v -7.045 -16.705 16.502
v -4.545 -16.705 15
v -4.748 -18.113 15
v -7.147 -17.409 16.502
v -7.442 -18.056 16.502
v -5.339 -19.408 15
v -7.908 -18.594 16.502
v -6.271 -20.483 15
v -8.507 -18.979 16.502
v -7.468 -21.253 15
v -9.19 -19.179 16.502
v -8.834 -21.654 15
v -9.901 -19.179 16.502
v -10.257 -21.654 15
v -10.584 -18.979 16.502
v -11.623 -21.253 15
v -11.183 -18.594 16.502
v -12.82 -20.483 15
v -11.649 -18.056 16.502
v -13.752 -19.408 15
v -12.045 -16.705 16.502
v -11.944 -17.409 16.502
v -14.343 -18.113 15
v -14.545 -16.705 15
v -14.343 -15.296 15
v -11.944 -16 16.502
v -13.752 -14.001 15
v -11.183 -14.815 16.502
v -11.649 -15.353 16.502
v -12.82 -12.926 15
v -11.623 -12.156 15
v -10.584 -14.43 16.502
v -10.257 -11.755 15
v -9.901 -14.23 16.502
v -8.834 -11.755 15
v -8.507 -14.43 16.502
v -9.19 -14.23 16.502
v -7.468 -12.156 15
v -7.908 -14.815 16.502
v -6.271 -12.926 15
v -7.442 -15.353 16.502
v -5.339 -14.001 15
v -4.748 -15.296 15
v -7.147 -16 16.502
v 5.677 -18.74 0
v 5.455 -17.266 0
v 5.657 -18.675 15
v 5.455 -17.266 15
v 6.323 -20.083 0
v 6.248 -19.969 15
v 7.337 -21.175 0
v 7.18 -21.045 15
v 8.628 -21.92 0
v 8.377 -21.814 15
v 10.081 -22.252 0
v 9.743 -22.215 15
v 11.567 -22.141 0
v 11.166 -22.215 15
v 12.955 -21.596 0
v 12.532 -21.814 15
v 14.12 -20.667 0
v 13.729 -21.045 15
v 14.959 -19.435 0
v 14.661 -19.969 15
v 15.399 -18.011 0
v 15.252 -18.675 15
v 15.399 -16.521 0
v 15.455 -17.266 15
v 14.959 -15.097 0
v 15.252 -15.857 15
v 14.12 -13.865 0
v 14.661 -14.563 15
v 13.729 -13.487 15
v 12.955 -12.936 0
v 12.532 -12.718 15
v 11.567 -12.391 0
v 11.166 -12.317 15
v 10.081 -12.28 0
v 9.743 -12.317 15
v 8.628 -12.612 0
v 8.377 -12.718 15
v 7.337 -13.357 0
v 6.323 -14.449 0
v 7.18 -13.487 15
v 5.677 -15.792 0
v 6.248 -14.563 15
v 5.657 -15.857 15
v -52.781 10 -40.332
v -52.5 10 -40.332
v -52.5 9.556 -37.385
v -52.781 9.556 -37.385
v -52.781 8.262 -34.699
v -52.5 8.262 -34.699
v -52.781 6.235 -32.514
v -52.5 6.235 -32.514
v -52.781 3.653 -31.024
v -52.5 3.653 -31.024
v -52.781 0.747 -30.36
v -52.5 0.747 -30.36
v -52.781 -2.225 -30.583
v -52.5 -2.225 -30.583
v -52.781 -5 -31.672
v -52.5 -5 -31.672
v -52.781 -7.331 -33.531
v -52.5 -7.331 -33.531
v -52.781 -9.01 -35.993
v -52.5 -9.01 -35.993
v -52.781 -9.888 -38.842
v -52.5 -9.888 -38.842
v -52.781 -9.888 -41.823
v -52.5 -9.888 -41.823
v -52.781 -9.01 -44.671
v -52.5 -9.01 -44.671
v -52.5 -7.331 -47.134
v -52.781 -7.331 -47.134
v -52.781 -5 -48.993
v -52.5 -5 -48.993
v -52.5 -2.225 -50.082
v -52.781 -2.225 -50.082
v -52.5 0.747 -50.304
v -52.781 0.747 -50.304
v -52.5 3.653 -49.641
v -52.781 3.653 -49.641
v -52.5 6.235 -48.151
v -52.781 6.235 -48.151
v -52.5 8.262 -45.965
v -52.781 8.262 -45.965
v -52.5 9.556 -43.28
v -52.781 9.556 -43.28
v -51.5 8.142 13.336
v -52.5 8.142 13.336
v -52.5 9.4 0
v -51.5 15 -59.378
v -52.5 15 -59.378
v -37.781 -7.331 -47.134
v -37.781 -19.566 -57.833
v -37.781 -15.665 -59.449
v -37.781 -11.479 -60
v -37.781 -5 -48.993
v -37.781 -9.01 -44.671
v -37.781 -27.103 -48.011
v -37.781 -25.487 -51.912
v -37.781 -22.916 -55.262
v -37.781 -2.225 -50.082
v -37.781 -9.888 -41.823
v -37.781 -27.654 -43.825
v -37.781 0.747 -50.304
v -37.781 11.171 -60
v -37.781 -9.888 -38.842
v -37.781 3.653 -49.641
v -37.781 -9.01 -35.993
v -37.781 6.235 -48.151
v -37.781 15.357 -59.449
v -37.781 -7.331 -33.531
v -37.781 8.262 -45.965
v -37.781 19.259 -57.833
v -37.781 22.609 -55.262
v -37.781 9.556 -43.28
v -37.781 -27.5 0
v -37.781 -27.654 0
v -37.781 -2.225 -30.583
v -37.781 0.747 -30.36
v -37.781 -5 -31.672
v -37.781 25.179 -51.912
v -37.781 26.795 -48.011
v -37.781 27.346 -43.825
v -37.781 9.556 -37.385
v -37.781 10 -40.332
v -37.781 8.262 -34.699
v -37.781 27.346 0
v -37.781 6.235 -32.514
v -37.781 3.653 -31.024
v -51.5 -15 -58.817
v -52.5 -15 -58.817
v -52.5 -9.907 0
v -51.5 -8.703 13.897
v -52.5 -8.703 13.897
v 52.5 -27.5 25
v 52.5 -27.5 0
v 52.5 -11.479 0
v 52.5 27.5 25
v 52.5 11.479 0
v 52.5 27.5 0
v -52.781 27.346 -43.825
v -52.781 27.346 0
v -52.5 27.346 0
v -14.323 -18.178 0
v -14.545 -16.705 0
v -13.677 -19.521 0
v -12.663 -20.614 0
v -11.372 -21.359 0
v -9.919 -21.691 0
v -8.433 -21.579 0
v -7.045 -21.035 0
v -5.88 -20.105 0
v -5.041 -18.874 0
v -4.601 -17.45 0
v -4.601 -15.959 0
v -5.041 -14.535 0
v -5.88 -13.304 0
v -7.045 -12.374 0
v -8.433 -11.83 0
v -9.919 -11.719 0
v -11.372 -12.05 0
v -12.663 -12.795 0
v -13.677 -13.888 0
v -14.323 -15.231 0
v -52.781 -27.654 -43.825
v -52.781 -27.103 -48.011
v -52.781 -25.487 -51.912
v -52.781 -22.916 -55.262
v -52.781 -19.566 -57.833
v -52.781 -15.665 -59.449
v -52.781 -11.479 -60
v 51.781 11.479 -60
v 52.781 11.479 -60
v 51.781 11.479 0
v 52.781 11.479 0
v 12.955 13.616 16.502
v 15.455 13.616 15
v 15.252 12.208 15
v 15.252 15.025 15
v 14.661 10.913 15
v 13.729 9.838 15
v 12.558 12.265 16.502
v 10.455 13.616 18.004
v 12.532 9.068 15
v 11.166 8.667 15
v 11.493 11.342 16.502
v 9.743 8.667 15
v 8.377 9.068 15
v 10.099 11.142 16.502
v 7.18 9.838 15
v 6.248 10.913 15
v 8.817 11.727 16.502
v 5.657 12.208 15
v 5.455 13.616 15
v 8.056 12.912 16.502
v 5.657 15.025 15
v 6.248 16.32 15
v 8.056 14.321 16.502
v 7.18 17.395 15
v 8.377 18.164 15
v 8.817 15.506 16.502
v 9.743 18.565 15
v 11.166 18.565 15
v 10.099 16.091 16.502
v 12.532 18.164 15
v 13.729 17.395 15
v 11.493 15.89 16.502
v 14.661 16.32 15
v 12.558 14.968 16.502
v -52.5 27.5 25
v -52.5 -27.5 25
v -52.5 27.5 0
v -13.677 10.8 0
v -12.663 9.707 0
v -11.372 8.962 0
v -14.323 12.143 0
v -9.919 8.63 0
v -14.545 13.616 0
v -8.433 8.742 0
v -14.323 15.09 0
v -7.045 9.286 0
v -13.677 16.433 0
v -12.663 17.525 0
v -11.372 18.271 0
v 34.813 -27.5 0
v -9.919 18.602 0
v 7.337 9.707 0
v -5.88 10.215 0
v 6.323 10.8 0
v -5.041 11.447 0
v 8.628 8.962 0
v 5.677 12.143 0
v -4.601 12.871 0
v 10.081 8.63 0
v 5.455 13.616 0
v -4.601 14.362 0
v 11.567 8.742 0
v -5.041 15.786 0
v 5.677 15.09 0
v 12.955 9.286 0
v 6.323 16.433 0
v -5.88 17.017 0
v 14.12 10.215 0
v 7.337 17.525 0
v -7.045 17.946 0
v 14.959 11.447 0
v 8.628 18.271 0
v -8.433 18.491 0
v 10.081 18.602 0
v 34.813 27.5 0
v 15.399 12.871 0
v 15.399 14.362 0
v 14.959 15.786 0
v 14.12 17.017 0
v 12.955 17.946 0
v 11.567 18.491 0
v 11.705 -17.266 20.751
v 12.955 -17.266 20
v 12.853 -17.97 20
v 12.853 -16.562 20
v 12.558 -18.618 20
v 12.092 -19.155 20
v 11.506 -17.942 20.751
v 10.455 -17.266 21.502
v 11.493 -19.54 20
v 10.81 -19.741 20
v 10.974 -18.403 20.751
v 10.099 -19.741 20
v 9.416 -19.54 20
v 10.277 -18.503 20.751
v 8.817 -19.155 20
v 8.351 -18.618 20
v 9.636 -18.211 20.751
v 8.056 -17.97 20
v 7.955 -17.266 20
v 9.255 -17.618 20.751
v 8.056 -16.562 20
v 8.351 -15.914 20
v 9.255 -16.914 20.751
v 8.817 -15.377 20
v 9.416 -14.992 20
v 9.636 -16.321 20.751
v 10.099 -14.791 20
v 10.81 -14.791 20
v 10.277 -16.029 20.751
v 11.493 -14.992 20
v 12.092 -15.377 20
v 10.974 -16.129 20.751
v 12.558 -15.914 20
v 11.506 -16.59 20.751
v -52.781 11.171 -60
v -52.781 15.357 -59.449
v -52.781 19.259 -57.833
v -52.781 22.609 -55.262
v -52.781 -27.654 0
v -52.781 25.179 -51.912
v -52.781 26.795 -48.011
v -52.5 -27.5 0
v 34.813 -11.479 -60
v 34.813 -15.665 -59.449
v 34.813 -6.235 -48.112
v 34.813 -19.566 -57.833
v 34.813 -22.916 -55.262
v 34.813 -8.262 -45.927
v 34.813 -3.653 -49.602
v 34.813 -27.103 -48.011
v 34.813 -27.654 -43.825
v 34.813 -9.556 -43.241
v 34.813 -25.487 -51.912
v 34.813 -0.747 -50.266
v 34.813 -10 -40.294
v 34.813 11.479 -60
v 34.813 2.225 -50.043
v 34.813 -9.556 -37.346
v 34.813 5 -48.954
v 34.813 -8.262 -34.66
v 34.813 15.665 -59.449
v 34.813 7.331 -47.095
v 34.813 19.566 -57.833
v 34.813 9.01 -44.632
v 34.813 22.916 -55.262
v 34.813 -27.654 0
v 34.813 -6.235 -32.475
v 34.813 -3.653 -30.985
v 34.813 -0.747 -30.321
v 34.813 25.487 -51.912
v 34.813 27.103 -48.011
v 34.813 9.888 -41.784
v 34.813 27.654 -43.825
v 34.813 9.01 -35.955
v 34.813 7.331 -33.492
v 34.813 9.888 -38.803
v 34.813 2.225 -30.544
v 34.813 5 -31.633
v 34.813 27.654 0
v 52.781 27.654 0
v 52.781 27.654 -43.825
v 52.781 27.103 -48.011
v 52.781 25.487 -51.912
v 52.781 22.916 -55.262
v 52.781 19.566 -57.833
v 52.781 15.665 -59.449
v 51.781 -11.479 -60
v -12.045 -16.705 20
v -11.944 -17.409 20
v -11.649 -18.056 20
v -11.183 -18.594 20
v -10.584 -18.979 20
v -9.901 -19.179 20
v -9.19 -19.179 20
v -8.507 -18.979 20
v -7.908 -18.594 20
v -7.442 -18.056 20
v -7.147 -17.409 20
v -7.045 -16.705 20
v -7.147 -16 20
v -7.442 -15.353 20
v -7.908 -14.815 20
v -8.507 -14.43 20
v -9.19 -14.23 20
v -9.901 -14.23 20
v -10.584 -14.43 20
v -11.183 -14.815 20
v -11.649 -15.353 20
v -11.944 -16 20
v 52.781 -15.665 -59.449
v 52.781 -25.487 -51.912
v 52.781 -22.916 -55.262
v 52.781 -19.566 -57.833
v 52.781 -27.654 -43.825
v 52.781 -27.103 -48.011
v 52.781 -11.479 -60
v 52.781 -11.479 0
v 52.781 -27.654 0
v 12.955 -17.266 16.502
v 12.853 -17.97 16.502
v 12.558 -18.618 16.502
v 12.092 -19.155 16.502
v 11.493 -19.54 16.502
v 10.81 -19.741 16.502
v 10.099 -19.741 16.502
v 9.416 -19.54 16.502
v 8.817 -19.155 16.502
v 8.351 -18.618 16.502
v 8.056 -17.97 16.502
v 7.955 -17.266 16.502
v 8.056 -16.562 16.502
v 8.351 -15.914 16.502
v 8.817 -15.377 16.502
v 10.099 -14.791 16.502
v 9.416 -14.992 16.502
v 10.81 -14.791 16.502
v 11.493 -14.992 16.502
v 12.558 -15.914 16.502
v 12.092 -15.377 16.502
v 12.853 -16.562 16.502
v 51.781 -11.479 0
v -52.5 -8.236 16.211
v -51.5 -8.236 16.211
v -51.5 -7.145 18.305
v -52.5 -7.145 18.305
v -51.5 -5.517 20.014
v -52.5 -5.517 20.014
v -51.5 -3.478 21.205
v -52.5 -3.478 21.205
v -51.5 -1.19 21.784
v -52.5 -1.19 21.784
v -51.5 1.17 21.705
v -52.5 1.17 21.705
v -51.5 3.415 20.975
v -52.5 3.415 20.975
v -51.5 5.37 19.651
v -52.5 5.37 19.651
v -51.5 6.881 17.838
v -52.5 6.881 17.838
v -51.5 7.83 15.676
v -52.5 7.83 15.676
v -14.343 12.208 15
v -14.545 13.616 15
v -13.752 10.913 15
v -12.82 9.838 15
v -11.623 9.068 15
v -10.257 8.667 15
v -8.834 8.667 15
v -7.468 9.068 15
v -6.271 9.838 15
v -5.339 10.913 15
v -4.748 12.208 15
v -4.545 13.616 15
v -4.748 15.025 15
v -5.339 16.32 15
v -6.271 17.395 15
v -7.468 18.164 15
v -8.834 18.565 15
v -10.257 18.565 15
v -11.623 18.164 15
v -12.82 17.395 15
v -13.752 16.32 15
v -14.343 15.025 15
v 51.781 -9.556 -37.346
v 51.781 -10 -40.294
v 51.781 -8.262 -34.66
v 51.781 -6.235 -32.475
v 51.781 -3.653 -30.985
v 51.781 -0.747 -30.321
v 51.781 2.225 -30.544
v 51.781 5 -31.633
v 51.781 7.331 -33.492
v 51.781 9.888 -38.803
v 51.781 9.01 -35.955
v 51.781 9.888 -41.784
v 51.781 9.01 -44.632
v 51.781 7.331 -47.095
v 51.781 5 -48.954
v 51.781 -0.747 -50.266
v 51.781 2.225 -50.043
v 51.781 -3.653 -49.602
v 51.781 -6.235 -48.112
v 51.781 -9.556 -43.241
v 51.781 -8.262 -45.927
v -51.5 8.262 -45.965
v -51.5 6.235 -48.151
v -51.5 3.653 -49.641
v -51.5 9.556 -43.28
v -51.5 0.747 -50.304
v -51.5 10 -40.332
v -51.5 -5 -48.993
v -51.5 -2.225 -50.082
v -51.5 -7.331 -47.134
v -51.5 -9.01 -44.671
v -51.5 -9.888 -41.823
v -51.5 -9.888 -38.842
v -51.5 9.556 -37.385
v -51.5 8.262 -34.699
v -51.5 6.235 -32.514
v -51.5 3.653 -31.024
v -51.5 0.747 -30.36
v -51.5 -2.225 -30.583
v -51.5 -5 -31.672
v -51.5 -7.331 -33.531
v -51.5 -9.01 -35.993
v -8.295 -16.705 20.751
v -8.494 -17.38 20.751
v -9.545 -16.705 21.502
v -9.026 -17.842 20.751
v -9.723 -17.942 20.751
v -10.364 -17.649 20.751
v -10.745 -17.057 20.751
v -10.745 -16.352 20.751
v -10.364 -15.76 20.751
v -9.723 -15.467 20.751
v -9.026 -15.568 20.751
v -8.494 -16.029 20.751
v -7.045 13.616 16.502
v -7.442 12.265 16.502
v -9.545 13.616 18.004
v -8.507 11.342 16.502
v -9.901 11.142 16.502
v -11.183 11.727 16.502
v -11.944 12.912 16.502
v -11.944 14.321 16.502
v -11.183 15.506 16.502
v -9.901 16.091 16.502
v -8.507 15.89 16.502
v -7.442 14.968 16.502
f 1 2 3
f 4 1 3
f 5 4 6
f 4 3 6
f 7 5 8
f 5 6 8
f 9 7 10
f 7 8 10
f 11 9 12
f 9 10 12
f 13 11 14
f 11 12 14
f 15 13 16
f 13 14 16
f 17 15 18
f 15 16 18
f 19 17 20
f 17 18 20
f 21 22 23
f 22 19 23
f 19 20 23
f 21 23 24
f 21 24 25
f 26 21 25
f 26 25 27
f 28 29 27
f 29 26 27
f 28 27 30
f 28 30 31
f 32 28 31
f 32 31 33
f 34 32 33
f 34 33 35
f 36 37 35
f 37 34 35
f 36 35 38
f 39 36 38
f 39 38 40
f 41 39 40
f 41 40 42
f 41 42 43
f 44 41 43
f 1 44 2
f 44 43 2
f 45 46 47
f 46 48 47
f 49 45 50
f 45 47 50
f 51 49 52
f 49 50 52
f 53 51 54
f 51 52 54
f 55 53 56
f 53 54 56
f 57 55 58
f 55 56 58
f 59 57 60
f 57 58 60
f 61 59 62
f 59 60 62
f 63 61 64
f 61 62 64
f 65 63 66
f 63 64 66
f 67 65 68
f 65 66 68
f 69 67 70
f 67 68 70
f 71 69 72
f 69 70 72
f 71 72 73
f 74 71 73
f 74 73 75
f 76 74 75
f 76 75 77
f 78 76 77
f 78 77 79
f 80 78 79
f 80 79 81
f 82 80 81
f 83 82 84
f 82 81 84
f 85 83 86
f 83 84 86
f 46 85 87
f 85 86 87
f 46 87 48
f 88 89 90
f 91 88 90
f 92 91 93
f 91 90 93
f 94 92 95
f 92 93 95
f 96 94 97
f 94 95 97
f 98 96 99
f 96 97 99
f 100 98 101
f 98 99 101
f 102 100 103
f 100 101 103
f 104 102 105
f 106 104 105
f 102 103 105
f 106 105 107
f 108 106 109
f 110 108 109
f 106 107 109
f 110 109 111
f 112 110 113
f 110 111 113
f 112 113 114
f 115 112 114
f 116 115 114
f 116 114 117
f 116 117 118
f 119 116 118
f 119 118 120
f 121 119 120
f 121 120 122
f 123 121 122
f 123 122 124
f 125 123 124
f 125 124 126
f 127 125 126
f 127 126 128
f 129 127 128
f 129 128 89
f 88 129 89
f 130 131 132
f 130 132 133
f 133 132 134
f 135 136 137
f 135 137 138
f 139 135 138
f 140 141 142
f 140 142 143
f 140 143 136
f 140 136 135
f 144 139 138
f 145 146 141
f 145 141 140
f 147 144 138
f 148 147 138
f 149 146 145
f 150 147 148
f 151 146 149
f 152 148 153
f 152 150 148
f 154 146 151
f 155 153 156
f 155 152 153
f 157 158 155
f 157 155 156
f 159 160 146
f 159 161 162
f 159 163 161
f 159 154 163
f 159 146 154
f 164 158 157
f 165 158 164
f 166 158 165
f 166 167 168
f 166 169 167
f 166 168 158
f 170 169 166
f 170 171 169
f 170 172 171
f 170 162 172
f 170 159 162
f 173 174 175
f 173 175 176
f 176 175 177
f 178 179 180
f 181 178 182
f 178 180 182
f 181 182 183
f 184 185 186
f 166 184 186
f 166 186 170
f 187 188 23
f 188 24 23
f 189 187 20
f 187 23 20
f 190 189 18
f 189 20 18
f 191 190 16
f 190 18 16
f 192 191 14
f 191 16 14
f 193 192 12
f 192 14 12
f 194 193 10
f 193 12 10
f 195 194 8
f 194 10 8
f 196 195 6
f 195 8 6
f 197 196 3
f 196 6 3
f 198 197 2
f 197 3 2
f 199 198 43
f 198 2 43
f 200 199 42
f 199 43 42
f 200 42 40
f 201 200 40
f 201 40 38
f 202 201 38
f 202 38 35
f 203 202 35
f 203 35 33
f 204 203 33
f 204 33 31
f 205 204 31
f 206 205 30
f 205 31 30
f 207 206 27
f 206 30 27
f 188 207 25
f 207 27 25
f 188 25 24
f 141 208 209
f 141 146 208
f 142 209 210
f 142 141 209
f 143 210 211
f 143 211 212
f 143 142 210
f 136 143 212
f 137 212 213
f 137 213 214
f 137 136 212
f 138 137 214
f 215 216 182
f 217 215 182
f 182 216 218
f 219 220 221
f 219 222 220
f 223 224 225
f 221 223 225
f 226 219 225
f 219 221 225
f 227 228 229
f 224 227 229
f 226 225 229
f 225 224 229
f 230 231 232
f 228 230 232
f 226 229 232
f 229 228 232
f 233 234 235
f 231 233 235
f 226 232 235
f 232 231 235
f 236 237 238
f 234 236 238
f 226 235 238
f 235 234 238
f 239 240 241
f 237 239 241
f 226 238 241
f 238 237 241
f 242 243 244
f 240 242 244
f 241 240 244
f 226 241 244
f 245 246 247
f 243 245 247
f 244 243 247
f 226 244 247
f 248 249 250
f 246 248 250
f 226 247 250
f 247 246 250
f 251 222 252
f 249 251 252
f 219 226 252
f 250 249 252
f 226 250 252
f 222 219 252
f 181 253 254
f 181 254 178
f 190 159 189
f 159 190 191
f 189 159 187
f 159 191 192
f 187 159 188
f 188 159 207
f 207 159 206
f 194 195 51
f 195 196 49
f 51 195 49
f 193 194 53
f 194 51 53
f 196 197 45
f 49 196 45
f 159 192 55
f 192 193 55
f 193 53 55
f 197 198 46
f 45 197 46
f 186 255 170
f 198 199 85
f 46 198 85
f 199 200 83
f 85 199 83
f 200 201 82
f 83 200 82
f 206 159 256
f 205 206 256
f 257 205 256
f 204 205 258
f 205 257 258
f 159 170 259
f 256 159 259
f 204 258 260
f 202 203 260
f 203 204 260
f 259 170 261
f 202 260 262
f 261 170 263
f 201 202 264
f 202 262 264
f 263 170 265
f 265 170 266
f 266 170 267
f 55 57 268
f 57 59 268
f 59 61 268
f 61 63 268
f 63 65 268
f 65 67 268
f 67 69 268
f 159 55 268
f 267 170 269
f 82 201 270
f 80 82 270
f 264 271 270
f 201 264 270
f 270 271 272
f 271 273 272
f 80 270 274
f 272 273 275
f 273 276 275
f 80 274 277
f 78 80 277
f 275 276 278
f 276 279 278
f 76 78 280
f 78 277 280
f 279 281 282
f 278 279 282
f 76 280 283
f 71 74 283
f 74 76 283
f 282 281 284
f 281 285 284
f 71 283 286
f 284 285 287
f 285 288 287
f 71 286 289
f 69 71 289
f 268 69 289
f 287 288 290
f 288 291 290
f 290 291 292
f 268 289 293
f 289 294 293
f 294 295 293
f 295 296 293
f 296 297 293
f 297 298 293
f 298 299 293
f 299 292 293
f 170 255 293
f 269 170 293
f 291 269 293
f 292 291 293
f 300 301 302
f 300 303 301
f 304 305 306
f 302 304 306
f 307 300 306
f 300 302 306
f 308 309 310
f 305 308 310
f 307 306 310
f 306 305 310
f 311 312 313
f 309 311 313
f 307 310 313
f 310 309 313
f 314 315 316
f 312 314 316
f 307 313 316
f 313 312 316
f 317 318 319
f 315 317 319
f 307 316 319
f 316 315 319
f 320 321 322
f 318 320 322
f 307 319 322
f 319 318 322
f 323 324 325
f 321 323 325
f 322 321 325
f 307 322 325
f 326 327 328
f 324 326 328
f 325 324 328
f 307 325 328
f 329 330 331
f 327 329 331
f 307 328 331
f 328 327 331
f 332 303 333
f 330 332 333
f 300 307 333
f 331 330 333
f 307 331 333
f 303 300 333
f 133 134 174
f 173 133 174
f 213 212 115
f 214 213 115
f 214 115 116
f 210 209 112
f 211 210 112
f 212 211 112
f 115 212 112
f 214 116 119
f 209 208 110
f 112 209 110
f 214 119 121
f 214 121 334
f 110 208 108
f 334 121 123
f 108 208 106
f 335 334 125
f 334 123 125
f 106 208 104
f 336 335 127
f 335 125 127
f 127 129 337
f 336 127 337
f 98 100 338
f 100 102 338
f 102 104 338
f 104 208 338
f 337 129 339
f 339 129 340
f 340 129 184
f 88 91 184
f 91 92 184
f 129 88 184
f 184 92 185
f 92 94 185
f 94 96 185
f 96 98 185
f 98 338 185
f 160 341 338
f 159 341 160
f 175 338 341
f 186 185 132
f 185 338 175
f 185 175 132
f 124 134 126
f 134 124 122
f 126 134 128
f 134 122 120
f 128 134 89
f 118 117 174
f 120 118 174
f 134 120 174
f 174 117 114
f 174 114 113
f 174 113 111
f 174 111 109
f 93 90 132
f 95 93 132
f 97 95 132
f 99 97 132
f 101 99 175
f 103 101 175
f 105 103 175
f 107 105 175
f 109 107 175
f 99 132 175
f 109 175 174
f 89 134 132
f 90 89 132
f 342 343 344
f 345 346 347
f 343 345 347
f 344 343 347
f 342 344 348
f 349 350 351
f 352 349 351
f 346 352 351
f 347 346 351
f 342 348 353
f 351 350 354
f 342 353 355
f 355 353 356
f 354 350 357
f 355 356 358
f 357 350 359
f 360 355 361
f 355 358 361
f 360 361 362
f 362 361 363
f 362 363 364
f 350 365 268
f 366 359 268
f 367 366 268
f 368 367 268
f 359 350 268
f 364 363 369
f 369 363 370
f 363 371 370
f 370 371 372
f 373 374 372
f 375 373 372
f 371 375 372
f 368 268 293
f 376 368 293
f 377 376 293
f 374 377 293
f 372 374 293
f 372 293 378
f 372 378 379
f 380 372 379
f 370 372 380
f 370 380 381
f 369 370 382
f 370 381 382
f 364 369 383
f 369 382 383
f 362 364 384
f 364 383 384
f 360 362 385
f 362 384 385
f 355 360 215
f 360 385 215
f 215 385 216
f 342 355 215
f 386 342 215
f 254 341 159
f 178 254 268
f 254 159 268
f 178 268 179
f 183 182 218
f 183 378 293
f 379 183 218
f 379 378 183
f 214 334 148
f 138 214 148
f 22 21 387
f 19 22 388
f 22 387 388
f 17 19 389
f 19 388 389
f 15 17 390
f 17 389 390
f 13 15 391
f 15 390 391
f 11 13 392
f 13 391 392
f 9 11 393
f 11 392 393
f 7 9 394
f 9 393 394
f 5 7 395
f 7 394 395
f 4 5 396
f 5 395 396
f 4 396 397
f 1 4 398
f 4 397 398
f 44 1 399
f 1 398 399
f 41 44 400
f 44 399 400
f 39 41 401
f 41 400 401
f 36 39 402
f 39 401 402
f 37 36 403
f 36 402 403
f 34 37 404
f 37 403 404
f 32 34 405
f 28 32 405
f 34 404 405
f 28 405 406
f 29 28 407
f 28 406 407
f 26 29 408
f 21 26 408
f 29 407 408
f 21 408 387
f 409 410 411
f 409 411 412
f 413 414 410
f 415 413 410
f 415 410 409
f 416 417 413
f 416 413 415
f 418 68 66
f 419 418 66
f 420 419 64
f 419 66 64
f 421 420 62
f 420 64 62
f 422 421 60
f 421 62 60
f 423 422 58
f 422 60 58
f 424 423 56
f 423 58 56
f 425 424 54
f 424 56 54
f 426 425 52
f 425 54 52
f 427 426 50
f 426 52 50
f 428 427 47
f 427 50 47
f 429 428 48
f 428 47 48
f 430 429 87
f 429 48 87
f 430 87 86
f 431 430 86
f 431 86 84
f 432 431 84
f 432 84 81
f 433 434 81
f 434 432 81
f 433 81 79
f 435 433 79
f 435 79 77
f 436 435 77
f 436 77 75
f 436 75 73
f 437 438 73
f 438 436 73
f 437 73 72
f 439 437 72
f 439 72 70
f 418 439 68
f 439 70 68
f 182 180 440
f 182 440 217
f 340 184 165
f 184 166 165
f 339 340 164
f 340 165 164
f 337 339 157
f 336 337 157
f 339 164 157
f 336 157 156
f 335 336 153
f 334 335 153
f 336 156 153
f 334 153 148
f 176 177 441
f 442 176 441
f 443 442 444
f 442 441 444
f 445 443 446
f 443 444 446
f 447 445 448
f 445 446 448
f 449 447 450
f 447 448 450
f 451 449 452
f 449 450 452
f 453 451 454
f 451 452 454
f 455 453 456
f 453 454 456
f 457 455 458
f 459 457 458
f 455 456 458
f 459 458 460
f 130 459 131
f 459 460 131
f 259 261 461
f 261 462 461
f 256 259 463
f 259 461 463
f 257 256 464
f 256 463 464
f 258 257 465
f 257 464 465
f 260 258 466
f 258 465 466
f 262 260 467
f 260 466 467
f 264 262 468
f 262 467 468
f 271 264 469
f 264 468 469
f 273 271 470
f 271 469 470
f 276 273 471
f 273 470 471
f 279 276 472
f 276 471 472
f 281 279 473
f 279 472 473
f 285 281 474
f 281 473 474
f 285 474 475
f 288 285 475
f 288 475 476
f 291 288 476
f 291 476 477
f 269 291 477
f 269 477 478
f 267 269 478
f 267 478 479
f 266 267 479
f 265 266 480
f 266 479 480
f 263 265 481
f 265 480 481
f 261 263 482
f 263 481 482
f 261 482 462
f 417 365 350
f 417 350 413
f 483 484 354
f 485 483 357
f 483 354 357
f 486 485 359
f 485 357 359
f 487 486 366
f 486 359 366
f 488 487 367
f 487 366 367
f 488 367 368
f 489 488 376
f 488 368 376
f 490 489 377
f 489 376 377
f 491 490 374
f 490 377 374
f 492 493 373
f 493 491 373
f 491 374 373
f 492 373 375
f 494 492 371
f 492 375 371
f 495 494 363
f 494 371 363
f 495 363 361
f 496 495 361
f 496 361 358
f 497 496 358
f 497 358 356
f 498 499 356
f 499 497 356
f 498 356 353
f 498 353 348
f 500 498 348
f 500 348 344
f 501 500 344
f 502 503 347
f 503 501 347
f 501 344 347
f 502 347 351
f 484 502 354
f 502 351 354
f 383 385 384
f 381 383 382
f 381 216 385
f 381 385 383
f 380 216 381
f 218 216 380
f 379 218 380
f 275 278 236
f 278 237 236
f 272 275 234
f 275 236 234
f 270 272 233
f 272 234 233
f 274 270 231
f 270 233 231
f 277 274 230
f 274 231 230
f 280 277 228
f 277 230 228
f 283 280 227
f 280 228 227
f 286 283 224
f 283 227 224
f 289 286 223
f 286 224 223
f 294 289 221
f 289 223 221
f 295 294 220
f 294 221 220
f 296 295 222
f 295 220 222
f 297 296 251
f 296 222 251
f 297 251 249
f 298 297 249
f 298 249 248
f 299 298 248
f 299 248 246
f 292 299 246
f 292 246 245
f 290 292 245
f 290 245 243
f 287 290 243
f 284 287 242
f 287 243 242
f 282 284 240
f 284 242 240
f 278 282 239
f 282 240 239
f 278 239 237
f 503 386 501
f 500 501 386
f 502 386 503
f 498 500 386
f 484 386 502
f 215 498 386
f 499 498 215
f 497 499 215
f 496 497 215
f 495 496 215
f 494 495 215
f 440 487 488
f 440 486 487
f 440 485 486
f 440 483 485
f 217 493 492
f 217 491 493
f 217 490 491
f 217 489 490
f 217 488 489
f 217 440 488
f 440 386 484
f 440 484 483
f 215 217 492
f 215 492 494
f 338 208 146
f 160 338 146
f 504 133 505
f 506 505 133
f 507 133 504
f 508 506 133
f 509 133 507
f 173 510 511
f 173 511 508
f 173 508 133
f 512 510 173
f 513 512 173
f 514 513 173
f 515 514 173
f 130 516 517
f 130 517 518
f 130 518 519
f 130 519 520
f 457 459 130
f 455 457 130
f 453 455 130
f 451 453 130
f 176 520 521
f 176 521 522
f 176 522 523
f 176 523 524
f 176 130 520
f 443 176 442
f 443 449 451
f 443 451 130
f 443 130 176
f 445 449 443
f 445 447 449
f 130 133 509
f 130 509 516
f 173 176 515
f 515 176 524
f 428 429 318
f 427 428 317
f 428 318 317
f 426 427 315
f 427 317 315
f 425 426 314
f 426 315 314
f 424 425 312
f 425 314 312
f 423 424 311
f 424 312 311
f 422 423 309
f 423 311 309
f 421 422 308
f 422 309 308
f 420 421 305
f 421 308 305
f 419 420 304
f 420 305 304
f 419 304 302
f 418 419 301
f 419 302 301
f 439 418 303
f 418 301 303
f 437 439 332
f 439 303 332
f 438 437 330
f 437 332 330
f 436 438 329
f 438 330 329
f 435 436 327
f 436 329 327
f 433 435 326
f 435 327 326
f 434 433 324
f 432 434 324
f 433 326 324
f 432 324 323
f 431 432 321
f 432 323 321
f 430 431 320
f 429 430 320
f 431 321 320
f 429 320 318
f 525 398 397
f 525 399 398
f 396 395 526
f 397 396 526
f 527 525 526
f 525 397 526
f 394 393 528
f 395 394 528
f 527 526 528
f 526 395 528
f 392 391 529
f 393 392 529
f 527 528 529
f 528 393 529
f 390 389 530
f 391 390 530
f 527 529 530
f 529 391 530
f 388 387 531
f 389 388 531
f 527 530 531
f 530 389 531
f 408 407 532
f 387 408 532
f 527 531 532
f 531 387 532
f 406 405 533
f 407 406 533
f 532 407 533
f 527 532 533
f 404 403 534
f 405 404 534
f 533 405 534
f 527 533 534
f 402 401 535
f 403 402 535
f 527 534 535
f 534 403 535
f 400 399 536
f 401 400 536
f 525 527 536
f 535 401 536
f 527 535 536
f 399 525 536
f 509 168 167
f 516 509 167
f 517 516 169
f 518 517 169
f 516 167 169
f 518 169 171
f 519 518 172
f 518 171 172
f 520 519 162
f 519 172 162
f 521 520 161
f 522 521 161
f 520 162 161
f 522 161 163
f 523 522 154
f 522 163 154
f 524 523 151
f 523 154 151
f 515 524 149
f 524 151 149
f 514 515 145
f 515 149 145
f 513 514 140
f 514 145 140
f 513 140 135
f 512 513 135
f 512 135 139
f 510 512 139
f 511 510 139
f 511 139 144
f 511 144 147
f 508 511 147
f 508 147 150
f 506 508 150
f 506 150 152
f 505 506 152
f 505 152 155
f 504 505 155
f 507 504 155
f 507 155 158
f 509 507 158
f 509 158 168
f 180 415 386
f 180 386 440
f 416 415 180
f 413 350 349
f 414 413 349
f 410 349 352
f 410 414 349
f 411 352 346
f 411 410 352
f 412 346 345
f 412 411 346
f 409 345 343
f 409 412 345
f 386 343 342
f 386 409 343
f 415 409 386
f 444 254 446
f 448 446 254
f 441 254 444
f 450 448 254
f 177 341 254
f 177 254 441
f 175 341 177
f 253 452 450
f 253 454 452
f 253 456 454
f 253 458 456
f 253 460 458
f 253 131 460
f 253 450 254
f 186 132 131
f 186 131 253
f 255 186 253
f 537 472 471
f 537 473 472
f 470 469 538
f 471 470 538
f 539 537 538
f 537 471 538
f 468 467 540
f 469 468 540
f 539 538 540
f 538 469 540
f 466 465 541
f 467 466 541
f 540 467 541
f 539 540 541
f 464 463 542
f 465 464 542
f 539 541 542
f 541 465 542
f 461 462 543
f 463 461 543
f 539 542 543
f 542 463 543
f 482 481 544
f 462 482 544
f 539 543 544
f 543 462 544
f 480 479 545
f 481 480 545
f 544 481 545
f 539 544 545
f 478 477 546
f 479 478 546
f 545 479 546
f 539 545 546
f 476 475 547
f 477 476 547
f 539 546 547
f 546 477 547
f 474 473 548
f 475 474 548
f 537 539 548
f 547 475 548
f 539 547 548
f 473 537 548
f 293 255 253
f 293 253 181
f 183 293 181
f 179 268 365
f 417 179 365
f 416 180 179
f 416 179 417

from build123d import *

# Parameters (mm, degrees)
F0_W           = 105
F0_H           = 55
F1_DEPTH       = 25
F2_D           = 10
F2_DEPTH       = 15
F2_TIP         = 3.0043030951
F3_D           = 5
F3_DEPTH       = 20
F3_TIP         = 1.5021515476
F4_W           = 15
F4_H           = 55
F4_W_2         = 17.9679095745
F4_H_2         = 55.3074888885
F5_DEPTH       = 60
F6_R           = 16.1752308679
F9_D           = 20
F9_DEPTH       = 50
F9_TIP         = 6.0086061903
F9_ON_F8_D     = 20
F9_ON_F8_DEPTH = 50
F9_ON_F8_TIP   = 6.0086061903
F10_W          = 22.9570271527
F10_H          = 60
F10_R          = 10
F11_DEPTH      = 1
F13_DEPTH      = 1


with BuildPart() as f1:
    # F0 (on Top) → F1 (new body)
    with BuildSketch(Plane.XY):
        Rectangle(F0_W, F0_H)
    extrude(amount=F1_DEPTH)

    # F2
    with Locations(Plane(origin=(0, 0, 0), x_dir=(1, 0, 0), z_dir=(0, 0, -1))):
        with Locations((-9.5454547554, -13.6163104326), (-9.5454547554, 16.7045462877), (10.4545452446, -13.6163104326), (10.4545452446, 17.2660425305)):
            Hole(F2_D / 2, depth=F2_DEPTH)
            with Locations((0, 0, -(F2_DEPTH + F2_TIP / 2))):  # 118° drill point
                Cone(0, F2_D / 2, F2_TIP, mode=Mode.SUBTRACT)

    # F3
    with Locations(Plane(origin=(0, 0, 0), x_dir=(1, 0, 0), z_dir=(0, 0, -1))):
        with Locations((-9.5454547554, 16.7045462877), (10.4545452446, 17.2660425305)):
            Hole(F3_D / 2, depth=F3_DEPTH)
            with Locations((0, 0, -(F3_DEPTH + F3_TIP / 2))):  # 118° drill point
                Cone(0, F3_D / 2, F3_TIP, mode=Mode.SUBTRACT)

    # F4 (on face) → F5 (join)
    with BuildSketch(Plane.XY):
        with Locations((-45.2807511389, -0.1537444443)):
            Rectangle(F4_W, F4_H)
        with Locations((43.7967926264, 0)):
            Rectangle(F4_W_2, F4_H_2)
    extrude(amount=-F5_DEPTH)

    # F6
    f6_edges = [f1.edges().sort_by_distance(p)[0] for p in [
        (-45.280751, 27.346256, -60),
        (-45.280751, -27.653744, -60),
        (43.796793, -27.653744, -60),
        (43.796793, 27.653744, -60),
    ]]
    fillet(f6_edges, radius=F6_R)

    # F9 (one way)
    with BuildSketch(Plane(origin=(34.8128378391, 0, 0), x_dir=(0, -1, 0), z_dir=(-1, 0, 0))):
        with Locations((0, -40.2935221791)):
            Circle(F9_D / 2)
    extrude(amount=-F9_DEPTH, mode=Mode.SUBTRACT)
    with Locations(Plane(origin=(34.8128378391, 0, 0), x_dir=(0, -1, 0), z_dir=(-1, 0, 0))):
        with Locations((0, -40.2935221791)):
            with Locations((0, 0, -(F9_DEPTH + F9_TIP / 2))):  # 118° drill point
                Cone(0, F9_D / 2, F9_TIP, mode=Mode.SUBTRACT)

    # F9 on F8 (one way)
    with BuildSketch(Plane.YZ.offset(-37.7807511389)):
        with Locations((0, -40.3322502971)):
            Circle(F9_ON_F8_D / 2)
    extrude(amount=-F9_ON_F8_DEPTH, mode=Mode.SUBTRACT)
    with Locations(Plane.YZ.offset(-37.7807511389)):
        with Locations((0, -40.3322502971)):
            with Locations((0, 0, -(F9_ON_F8_DEPTH + F9_ON_F8_TIP / 2))):  # 118° drill point
                Cone(0, F9_ON_F8_D / 2, F9_ON_F8_TIP, mode=Mode.SUBTRACT)

    # F10 (on face) → F11 (cut)
    with BuildSketch(Plane.YZ.offset(52.7807474136)):
        with Locations((0, -30)):
            Rectangle(F10_W, F10_H)
        with Locations((0, -40.2935221791)):
            Circle(F10_R, mode=Mode.SUBTRACT)
    extrude(amount=-F11_DEPTH, mode=Mode.SUBTRACT)

    # F12 (on face) → F13 (cut)
    with BuildSketch(Plane(origin=(-52.5, 0, 0), x_dir=(0, -1, 0), z_dir=(-1, 0, 0))):
        with BuildLine():
            Line((-8.1417122856, 13.3355623111), (8.7032085285, 13.8970594853))
            ThreePointArc((8.7032085285, 13.8970594853), (0.0070411683, 21.8275222154), (-8.1417122856, 13.3355623111))
        make_face()
        Polygon((15, -58.8169405147), (8.7032085285, 13.8970594853), (-8.1417122856, 13.3355623111), (-15, -59.3783445656), align=None)
    extrude(amount=-F13_DEPTH, mode=Mode.SUBTRACT)


solid = f1.part
